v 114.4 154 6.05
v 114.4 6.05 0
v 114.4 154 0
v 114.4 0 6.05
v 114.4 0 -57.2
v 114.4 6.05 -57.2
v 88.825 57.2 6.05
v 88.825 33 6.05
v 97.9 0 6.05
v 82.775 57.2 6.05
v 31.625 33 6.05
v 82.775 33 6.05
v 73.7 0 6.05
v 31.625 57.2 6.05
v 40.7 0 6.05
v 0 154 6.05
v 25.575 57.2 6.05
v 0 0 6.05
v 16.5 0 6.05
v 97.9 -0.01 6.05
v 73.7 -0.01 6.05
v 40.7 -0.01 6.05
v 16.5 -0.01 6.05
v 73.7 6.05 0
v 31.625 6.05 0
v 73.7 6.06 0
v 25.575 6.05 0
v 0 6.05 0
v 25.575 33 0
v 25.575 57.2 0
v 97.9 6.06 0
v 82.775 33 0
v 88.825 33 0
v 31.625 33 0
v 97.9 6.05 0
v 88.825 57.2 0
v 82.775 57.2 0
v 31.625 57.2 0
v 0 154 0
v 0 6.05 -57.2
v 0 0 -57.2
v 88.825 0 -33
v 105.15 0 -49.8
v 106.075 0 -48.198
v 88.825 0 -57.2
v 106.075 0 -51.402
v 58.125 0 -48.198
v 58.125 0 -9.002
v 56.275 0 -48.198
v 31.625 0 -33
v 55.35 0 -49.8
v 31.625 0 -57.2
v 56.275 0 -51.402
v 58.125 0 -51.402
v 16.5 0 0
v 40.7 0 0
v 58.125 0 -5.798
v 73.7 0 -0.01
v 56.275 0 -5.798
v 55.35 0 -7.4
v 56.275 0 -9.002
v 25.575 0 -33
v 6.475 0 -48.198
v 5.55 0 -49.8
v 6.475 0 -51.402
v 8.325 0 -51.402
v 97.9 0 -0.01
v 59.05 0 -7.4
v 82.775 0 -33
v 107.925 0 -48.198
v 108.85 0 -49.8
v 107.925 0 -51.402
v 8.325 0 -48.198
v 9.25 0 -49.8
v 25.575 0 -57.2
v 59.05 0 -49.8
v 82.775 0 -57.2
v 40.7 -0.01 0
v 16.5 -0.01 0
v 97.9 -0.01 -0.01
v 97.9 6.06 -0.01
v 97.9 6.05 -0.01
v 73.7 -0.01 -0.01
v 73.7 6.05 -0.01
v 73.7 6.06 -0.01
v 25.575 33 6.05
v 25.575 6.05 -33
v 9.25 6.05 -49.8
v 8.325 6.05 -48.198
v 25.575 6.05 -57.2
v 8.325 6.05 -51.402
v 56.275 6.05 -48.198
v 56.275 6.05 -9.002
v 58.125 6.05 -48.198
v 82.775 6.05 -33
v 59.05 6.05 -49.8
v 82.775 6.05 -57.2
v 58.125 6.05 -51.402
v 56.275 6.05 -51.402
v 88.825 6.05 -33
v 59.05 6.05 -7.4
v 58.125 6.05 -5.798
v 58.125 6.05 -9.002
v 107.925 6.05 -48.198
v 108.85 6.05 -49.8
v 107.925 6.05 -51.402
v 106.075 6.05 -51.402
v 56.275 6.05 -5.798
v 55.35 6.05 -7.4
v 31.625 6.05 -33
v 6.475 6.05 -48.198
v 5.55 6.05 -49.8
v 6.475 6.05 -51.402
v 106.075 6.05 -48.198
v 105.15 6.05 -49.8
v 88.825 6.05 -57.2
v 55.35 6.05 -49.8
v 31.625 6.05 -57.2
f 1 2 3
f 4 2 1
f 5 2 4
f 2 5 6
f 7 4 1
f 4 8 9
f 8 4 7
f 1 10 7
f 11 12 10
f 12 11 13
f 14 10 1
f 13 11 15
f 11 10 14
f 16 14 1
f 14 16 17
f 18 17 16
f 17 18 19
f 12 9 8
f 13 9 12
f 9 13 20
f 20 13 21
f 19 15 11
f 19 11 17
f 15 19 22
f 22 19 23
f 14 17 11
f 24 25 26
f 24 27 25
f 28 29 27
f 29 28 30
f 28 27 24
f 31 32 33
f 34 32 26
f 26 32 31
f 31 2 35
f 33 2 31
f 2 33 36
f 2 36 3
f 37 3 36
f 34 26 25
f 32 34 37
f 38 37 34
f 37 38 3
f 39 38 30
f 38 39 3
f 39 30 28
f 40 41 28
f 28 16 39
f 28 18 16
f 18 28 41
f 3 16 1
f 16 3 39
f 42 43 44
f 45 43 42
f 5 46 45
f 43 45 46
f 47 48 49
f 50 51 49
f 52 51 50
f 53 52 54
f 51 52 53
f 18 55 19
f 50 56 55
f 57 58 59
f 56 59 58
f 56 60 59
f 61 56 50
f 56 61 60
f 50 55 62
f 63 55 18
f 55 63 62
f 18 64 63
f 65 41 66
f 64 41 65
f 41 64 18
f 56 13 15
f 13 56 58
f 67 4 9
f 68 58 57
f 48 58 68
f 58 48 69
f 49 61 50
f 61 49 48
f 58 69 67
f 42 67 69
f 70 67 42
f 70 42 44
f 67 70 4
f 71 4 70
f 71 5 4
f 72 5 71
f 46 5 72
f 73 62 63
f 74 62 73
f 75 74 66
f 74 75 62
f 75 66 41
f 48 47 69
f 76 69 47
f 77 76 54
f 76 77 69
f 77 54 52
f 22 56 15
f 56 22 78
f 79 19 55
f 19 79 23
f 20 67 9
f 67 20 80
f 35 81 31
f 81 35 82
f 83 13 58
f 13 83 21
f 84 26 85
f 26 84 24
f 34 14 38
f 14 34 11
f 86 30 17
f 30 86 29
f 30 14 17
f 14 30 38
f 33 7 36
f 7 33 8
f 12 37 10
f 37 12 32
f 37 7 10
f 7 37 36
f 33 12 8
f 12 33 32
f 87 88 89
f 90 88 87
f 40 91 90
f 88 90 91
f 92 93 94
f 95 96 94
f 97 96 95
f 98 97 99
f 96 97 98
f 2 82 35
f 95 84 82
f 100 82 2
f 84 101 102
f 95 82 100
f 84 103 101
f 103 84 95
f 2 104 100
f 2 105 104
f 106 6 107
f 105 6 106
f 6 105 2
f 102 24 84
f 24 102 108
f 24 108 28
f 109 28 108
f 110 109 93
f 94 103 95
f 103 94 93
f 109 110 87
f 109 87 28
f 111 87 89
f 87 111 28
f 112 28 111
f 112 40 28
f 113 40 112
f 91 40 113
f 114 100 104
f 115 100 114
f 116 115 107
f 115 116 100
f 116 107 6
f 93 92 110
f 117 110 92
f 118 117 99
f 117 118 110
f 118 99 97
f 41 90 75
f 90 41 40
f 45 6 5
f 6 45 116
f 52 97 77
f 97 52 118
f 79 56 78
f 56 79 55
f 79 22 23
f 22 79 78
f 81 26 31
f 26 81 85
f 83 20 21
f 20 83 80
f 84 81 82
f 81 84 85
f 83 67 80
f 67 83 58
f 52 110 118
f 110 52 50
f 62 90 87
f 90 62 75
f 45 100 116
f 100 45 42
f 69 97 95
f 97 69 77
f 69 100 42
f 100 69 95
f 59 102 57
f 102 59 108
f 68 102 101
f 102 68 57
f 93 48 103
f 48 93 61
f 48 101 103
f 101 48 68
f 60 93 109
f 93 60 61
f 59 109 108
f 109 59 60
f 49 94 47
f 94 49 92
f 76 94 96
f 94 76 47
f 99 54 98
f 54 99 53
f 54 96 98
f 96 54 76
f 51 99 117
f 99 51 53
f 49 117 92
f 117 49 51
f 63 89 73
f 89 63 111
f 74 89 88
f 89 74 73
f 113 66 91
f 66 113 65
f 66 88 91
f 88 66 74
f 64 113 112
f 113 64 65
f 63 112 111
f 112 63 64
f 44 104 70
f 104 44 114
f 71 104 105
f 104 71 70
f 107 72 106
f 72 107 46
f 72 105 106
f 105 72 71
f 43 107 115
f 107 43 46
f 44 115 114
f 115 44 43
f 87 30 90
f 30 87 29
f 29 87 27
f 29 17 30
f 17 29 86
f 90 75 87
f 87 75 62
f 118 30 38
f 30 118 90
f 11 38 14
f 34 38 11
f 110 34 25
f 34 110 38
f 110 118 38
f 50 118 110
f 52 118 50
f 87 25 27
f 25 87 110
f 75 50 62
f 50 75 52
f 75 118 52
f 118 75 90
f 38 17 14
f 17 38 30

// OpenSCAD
boxWidth = 114.4;
boxDepth = 77;
shelfThickness = 6.05;
tabSize = 4 * shelfThickness;
screwM=3.7;

module mainShelf() {
    difference() {
        cube([boxWidth, boxDepth * 2, shelfThickness]);
        translate([(boxWidth / 4) - (tabSize / 2),- 0.01, -0.01]) {
            cube([tabSize, shelfThickness + 0.01, shelfThickness + 0.02]);
        }
        translate([(boxWidth * (3 / 4)) - (tabSize / 2),- 0.01, -0.01]) {
            cube([tabSize, shelfThickness + 0.01, shelfThickness + 0.02]);
        }
        translate([(boxWidth / 4) - (shelfThickness / 2), boxWidth / 2 - tabSize, -0.01]) {
           cube([shelfThickness, tabSize, shelfThickness + 0.02]); 
        }
        translate([(boxWidth * (3 / 4)) - (shelfThickness / 2), boxWidth / 2 - tabSize, -0.01]) {
           cube([shelfThickness, tabSize, shelfThickness + 0.02]); 
        }
    }
}

module supportShelf() {
    difference() {
        union() {
            cube([boxWidth, boxWidth / 2, shelfThickness]);
            translate([(boxWidth / 4) - (tabSize / 2),- shelfThickness, -0.01]) {
                cube([tabSize, shelfThickness, shelfThickness + 0.02]);
            }
            translate([(boxWidth * (3 / 4)) - (tabSize / 2),- shelfThickness, -0.01]) {
                cube([tabSize, shelfThickness + 0.01, shelfThickness + 0.02]);
            }
        }
        translate([(boxWidth / 4) - (shelfThickness / 2), boxWidth / 2 - tabSize, -0.01]) {
           cube([shelfThickness, tabSize, shelfThickness + 0.02]); 
        }
        translate([(boxWidth * (3 / 4)) - (shelfThickness / 2), boxWidth / 2 - tabSize, -0.01]) {
           cube([shelfThickness, tabSize, shelfThickness + 0.02]); 
        }
        translate([(boxWidth / 2), 2 * screwM, -0.01]) {
            cylinder(h=shelfThickness+0.02,r=screwM/2);
        }
        translate([(boxWidth / 2), boxWidth / 2 - 2 * screwM, -0.01]) {
            cylinder(h=shelfThickness+0.02,r=screwM/2);
        }
        translate([(0 + 2 * screwM), boxWidth / 2 - 2 * screwM, -0.01]) {
            cylinder(h=shelfThickness+0.02,r=screwM/2);
        }
        translate([(boxWidth - 2 * screwM), boxWidth / 2 - 2 * screwM, -0.01]) {
            cylinder(h=shelfThickness+0.02,r=screwM/2);
        }
    }
}

mainShelf();

rotate([-90, 0, 0]) {
    supportShelf();
}

module supportTriangle() {
    union() {
        linear_extrude(shelfThickness) {
            polygon([[0,-boxWidth/2 + (0 * shelfThickness)], [0,0], [boxWidth / 2 - shelfThickness,0]]);
        }
        translate([-shelfThickness, -boxWidth / 2 , 0]) {
            cube([shelfThickness, tabSize, shelfThickness]);
        }
        translate([boxWidth / 2 - tabSize - shelfThickness, 0]) {
            cube([tabSize,shelfThickness , shelfThickness]);
        }
    }
}

translate([(boxWidth / 4) - (shelfThickness/ 2),shelfThickness, 0]) {
    rotate([90, 0, 90]) {
        supportTriangle();
    }
}
